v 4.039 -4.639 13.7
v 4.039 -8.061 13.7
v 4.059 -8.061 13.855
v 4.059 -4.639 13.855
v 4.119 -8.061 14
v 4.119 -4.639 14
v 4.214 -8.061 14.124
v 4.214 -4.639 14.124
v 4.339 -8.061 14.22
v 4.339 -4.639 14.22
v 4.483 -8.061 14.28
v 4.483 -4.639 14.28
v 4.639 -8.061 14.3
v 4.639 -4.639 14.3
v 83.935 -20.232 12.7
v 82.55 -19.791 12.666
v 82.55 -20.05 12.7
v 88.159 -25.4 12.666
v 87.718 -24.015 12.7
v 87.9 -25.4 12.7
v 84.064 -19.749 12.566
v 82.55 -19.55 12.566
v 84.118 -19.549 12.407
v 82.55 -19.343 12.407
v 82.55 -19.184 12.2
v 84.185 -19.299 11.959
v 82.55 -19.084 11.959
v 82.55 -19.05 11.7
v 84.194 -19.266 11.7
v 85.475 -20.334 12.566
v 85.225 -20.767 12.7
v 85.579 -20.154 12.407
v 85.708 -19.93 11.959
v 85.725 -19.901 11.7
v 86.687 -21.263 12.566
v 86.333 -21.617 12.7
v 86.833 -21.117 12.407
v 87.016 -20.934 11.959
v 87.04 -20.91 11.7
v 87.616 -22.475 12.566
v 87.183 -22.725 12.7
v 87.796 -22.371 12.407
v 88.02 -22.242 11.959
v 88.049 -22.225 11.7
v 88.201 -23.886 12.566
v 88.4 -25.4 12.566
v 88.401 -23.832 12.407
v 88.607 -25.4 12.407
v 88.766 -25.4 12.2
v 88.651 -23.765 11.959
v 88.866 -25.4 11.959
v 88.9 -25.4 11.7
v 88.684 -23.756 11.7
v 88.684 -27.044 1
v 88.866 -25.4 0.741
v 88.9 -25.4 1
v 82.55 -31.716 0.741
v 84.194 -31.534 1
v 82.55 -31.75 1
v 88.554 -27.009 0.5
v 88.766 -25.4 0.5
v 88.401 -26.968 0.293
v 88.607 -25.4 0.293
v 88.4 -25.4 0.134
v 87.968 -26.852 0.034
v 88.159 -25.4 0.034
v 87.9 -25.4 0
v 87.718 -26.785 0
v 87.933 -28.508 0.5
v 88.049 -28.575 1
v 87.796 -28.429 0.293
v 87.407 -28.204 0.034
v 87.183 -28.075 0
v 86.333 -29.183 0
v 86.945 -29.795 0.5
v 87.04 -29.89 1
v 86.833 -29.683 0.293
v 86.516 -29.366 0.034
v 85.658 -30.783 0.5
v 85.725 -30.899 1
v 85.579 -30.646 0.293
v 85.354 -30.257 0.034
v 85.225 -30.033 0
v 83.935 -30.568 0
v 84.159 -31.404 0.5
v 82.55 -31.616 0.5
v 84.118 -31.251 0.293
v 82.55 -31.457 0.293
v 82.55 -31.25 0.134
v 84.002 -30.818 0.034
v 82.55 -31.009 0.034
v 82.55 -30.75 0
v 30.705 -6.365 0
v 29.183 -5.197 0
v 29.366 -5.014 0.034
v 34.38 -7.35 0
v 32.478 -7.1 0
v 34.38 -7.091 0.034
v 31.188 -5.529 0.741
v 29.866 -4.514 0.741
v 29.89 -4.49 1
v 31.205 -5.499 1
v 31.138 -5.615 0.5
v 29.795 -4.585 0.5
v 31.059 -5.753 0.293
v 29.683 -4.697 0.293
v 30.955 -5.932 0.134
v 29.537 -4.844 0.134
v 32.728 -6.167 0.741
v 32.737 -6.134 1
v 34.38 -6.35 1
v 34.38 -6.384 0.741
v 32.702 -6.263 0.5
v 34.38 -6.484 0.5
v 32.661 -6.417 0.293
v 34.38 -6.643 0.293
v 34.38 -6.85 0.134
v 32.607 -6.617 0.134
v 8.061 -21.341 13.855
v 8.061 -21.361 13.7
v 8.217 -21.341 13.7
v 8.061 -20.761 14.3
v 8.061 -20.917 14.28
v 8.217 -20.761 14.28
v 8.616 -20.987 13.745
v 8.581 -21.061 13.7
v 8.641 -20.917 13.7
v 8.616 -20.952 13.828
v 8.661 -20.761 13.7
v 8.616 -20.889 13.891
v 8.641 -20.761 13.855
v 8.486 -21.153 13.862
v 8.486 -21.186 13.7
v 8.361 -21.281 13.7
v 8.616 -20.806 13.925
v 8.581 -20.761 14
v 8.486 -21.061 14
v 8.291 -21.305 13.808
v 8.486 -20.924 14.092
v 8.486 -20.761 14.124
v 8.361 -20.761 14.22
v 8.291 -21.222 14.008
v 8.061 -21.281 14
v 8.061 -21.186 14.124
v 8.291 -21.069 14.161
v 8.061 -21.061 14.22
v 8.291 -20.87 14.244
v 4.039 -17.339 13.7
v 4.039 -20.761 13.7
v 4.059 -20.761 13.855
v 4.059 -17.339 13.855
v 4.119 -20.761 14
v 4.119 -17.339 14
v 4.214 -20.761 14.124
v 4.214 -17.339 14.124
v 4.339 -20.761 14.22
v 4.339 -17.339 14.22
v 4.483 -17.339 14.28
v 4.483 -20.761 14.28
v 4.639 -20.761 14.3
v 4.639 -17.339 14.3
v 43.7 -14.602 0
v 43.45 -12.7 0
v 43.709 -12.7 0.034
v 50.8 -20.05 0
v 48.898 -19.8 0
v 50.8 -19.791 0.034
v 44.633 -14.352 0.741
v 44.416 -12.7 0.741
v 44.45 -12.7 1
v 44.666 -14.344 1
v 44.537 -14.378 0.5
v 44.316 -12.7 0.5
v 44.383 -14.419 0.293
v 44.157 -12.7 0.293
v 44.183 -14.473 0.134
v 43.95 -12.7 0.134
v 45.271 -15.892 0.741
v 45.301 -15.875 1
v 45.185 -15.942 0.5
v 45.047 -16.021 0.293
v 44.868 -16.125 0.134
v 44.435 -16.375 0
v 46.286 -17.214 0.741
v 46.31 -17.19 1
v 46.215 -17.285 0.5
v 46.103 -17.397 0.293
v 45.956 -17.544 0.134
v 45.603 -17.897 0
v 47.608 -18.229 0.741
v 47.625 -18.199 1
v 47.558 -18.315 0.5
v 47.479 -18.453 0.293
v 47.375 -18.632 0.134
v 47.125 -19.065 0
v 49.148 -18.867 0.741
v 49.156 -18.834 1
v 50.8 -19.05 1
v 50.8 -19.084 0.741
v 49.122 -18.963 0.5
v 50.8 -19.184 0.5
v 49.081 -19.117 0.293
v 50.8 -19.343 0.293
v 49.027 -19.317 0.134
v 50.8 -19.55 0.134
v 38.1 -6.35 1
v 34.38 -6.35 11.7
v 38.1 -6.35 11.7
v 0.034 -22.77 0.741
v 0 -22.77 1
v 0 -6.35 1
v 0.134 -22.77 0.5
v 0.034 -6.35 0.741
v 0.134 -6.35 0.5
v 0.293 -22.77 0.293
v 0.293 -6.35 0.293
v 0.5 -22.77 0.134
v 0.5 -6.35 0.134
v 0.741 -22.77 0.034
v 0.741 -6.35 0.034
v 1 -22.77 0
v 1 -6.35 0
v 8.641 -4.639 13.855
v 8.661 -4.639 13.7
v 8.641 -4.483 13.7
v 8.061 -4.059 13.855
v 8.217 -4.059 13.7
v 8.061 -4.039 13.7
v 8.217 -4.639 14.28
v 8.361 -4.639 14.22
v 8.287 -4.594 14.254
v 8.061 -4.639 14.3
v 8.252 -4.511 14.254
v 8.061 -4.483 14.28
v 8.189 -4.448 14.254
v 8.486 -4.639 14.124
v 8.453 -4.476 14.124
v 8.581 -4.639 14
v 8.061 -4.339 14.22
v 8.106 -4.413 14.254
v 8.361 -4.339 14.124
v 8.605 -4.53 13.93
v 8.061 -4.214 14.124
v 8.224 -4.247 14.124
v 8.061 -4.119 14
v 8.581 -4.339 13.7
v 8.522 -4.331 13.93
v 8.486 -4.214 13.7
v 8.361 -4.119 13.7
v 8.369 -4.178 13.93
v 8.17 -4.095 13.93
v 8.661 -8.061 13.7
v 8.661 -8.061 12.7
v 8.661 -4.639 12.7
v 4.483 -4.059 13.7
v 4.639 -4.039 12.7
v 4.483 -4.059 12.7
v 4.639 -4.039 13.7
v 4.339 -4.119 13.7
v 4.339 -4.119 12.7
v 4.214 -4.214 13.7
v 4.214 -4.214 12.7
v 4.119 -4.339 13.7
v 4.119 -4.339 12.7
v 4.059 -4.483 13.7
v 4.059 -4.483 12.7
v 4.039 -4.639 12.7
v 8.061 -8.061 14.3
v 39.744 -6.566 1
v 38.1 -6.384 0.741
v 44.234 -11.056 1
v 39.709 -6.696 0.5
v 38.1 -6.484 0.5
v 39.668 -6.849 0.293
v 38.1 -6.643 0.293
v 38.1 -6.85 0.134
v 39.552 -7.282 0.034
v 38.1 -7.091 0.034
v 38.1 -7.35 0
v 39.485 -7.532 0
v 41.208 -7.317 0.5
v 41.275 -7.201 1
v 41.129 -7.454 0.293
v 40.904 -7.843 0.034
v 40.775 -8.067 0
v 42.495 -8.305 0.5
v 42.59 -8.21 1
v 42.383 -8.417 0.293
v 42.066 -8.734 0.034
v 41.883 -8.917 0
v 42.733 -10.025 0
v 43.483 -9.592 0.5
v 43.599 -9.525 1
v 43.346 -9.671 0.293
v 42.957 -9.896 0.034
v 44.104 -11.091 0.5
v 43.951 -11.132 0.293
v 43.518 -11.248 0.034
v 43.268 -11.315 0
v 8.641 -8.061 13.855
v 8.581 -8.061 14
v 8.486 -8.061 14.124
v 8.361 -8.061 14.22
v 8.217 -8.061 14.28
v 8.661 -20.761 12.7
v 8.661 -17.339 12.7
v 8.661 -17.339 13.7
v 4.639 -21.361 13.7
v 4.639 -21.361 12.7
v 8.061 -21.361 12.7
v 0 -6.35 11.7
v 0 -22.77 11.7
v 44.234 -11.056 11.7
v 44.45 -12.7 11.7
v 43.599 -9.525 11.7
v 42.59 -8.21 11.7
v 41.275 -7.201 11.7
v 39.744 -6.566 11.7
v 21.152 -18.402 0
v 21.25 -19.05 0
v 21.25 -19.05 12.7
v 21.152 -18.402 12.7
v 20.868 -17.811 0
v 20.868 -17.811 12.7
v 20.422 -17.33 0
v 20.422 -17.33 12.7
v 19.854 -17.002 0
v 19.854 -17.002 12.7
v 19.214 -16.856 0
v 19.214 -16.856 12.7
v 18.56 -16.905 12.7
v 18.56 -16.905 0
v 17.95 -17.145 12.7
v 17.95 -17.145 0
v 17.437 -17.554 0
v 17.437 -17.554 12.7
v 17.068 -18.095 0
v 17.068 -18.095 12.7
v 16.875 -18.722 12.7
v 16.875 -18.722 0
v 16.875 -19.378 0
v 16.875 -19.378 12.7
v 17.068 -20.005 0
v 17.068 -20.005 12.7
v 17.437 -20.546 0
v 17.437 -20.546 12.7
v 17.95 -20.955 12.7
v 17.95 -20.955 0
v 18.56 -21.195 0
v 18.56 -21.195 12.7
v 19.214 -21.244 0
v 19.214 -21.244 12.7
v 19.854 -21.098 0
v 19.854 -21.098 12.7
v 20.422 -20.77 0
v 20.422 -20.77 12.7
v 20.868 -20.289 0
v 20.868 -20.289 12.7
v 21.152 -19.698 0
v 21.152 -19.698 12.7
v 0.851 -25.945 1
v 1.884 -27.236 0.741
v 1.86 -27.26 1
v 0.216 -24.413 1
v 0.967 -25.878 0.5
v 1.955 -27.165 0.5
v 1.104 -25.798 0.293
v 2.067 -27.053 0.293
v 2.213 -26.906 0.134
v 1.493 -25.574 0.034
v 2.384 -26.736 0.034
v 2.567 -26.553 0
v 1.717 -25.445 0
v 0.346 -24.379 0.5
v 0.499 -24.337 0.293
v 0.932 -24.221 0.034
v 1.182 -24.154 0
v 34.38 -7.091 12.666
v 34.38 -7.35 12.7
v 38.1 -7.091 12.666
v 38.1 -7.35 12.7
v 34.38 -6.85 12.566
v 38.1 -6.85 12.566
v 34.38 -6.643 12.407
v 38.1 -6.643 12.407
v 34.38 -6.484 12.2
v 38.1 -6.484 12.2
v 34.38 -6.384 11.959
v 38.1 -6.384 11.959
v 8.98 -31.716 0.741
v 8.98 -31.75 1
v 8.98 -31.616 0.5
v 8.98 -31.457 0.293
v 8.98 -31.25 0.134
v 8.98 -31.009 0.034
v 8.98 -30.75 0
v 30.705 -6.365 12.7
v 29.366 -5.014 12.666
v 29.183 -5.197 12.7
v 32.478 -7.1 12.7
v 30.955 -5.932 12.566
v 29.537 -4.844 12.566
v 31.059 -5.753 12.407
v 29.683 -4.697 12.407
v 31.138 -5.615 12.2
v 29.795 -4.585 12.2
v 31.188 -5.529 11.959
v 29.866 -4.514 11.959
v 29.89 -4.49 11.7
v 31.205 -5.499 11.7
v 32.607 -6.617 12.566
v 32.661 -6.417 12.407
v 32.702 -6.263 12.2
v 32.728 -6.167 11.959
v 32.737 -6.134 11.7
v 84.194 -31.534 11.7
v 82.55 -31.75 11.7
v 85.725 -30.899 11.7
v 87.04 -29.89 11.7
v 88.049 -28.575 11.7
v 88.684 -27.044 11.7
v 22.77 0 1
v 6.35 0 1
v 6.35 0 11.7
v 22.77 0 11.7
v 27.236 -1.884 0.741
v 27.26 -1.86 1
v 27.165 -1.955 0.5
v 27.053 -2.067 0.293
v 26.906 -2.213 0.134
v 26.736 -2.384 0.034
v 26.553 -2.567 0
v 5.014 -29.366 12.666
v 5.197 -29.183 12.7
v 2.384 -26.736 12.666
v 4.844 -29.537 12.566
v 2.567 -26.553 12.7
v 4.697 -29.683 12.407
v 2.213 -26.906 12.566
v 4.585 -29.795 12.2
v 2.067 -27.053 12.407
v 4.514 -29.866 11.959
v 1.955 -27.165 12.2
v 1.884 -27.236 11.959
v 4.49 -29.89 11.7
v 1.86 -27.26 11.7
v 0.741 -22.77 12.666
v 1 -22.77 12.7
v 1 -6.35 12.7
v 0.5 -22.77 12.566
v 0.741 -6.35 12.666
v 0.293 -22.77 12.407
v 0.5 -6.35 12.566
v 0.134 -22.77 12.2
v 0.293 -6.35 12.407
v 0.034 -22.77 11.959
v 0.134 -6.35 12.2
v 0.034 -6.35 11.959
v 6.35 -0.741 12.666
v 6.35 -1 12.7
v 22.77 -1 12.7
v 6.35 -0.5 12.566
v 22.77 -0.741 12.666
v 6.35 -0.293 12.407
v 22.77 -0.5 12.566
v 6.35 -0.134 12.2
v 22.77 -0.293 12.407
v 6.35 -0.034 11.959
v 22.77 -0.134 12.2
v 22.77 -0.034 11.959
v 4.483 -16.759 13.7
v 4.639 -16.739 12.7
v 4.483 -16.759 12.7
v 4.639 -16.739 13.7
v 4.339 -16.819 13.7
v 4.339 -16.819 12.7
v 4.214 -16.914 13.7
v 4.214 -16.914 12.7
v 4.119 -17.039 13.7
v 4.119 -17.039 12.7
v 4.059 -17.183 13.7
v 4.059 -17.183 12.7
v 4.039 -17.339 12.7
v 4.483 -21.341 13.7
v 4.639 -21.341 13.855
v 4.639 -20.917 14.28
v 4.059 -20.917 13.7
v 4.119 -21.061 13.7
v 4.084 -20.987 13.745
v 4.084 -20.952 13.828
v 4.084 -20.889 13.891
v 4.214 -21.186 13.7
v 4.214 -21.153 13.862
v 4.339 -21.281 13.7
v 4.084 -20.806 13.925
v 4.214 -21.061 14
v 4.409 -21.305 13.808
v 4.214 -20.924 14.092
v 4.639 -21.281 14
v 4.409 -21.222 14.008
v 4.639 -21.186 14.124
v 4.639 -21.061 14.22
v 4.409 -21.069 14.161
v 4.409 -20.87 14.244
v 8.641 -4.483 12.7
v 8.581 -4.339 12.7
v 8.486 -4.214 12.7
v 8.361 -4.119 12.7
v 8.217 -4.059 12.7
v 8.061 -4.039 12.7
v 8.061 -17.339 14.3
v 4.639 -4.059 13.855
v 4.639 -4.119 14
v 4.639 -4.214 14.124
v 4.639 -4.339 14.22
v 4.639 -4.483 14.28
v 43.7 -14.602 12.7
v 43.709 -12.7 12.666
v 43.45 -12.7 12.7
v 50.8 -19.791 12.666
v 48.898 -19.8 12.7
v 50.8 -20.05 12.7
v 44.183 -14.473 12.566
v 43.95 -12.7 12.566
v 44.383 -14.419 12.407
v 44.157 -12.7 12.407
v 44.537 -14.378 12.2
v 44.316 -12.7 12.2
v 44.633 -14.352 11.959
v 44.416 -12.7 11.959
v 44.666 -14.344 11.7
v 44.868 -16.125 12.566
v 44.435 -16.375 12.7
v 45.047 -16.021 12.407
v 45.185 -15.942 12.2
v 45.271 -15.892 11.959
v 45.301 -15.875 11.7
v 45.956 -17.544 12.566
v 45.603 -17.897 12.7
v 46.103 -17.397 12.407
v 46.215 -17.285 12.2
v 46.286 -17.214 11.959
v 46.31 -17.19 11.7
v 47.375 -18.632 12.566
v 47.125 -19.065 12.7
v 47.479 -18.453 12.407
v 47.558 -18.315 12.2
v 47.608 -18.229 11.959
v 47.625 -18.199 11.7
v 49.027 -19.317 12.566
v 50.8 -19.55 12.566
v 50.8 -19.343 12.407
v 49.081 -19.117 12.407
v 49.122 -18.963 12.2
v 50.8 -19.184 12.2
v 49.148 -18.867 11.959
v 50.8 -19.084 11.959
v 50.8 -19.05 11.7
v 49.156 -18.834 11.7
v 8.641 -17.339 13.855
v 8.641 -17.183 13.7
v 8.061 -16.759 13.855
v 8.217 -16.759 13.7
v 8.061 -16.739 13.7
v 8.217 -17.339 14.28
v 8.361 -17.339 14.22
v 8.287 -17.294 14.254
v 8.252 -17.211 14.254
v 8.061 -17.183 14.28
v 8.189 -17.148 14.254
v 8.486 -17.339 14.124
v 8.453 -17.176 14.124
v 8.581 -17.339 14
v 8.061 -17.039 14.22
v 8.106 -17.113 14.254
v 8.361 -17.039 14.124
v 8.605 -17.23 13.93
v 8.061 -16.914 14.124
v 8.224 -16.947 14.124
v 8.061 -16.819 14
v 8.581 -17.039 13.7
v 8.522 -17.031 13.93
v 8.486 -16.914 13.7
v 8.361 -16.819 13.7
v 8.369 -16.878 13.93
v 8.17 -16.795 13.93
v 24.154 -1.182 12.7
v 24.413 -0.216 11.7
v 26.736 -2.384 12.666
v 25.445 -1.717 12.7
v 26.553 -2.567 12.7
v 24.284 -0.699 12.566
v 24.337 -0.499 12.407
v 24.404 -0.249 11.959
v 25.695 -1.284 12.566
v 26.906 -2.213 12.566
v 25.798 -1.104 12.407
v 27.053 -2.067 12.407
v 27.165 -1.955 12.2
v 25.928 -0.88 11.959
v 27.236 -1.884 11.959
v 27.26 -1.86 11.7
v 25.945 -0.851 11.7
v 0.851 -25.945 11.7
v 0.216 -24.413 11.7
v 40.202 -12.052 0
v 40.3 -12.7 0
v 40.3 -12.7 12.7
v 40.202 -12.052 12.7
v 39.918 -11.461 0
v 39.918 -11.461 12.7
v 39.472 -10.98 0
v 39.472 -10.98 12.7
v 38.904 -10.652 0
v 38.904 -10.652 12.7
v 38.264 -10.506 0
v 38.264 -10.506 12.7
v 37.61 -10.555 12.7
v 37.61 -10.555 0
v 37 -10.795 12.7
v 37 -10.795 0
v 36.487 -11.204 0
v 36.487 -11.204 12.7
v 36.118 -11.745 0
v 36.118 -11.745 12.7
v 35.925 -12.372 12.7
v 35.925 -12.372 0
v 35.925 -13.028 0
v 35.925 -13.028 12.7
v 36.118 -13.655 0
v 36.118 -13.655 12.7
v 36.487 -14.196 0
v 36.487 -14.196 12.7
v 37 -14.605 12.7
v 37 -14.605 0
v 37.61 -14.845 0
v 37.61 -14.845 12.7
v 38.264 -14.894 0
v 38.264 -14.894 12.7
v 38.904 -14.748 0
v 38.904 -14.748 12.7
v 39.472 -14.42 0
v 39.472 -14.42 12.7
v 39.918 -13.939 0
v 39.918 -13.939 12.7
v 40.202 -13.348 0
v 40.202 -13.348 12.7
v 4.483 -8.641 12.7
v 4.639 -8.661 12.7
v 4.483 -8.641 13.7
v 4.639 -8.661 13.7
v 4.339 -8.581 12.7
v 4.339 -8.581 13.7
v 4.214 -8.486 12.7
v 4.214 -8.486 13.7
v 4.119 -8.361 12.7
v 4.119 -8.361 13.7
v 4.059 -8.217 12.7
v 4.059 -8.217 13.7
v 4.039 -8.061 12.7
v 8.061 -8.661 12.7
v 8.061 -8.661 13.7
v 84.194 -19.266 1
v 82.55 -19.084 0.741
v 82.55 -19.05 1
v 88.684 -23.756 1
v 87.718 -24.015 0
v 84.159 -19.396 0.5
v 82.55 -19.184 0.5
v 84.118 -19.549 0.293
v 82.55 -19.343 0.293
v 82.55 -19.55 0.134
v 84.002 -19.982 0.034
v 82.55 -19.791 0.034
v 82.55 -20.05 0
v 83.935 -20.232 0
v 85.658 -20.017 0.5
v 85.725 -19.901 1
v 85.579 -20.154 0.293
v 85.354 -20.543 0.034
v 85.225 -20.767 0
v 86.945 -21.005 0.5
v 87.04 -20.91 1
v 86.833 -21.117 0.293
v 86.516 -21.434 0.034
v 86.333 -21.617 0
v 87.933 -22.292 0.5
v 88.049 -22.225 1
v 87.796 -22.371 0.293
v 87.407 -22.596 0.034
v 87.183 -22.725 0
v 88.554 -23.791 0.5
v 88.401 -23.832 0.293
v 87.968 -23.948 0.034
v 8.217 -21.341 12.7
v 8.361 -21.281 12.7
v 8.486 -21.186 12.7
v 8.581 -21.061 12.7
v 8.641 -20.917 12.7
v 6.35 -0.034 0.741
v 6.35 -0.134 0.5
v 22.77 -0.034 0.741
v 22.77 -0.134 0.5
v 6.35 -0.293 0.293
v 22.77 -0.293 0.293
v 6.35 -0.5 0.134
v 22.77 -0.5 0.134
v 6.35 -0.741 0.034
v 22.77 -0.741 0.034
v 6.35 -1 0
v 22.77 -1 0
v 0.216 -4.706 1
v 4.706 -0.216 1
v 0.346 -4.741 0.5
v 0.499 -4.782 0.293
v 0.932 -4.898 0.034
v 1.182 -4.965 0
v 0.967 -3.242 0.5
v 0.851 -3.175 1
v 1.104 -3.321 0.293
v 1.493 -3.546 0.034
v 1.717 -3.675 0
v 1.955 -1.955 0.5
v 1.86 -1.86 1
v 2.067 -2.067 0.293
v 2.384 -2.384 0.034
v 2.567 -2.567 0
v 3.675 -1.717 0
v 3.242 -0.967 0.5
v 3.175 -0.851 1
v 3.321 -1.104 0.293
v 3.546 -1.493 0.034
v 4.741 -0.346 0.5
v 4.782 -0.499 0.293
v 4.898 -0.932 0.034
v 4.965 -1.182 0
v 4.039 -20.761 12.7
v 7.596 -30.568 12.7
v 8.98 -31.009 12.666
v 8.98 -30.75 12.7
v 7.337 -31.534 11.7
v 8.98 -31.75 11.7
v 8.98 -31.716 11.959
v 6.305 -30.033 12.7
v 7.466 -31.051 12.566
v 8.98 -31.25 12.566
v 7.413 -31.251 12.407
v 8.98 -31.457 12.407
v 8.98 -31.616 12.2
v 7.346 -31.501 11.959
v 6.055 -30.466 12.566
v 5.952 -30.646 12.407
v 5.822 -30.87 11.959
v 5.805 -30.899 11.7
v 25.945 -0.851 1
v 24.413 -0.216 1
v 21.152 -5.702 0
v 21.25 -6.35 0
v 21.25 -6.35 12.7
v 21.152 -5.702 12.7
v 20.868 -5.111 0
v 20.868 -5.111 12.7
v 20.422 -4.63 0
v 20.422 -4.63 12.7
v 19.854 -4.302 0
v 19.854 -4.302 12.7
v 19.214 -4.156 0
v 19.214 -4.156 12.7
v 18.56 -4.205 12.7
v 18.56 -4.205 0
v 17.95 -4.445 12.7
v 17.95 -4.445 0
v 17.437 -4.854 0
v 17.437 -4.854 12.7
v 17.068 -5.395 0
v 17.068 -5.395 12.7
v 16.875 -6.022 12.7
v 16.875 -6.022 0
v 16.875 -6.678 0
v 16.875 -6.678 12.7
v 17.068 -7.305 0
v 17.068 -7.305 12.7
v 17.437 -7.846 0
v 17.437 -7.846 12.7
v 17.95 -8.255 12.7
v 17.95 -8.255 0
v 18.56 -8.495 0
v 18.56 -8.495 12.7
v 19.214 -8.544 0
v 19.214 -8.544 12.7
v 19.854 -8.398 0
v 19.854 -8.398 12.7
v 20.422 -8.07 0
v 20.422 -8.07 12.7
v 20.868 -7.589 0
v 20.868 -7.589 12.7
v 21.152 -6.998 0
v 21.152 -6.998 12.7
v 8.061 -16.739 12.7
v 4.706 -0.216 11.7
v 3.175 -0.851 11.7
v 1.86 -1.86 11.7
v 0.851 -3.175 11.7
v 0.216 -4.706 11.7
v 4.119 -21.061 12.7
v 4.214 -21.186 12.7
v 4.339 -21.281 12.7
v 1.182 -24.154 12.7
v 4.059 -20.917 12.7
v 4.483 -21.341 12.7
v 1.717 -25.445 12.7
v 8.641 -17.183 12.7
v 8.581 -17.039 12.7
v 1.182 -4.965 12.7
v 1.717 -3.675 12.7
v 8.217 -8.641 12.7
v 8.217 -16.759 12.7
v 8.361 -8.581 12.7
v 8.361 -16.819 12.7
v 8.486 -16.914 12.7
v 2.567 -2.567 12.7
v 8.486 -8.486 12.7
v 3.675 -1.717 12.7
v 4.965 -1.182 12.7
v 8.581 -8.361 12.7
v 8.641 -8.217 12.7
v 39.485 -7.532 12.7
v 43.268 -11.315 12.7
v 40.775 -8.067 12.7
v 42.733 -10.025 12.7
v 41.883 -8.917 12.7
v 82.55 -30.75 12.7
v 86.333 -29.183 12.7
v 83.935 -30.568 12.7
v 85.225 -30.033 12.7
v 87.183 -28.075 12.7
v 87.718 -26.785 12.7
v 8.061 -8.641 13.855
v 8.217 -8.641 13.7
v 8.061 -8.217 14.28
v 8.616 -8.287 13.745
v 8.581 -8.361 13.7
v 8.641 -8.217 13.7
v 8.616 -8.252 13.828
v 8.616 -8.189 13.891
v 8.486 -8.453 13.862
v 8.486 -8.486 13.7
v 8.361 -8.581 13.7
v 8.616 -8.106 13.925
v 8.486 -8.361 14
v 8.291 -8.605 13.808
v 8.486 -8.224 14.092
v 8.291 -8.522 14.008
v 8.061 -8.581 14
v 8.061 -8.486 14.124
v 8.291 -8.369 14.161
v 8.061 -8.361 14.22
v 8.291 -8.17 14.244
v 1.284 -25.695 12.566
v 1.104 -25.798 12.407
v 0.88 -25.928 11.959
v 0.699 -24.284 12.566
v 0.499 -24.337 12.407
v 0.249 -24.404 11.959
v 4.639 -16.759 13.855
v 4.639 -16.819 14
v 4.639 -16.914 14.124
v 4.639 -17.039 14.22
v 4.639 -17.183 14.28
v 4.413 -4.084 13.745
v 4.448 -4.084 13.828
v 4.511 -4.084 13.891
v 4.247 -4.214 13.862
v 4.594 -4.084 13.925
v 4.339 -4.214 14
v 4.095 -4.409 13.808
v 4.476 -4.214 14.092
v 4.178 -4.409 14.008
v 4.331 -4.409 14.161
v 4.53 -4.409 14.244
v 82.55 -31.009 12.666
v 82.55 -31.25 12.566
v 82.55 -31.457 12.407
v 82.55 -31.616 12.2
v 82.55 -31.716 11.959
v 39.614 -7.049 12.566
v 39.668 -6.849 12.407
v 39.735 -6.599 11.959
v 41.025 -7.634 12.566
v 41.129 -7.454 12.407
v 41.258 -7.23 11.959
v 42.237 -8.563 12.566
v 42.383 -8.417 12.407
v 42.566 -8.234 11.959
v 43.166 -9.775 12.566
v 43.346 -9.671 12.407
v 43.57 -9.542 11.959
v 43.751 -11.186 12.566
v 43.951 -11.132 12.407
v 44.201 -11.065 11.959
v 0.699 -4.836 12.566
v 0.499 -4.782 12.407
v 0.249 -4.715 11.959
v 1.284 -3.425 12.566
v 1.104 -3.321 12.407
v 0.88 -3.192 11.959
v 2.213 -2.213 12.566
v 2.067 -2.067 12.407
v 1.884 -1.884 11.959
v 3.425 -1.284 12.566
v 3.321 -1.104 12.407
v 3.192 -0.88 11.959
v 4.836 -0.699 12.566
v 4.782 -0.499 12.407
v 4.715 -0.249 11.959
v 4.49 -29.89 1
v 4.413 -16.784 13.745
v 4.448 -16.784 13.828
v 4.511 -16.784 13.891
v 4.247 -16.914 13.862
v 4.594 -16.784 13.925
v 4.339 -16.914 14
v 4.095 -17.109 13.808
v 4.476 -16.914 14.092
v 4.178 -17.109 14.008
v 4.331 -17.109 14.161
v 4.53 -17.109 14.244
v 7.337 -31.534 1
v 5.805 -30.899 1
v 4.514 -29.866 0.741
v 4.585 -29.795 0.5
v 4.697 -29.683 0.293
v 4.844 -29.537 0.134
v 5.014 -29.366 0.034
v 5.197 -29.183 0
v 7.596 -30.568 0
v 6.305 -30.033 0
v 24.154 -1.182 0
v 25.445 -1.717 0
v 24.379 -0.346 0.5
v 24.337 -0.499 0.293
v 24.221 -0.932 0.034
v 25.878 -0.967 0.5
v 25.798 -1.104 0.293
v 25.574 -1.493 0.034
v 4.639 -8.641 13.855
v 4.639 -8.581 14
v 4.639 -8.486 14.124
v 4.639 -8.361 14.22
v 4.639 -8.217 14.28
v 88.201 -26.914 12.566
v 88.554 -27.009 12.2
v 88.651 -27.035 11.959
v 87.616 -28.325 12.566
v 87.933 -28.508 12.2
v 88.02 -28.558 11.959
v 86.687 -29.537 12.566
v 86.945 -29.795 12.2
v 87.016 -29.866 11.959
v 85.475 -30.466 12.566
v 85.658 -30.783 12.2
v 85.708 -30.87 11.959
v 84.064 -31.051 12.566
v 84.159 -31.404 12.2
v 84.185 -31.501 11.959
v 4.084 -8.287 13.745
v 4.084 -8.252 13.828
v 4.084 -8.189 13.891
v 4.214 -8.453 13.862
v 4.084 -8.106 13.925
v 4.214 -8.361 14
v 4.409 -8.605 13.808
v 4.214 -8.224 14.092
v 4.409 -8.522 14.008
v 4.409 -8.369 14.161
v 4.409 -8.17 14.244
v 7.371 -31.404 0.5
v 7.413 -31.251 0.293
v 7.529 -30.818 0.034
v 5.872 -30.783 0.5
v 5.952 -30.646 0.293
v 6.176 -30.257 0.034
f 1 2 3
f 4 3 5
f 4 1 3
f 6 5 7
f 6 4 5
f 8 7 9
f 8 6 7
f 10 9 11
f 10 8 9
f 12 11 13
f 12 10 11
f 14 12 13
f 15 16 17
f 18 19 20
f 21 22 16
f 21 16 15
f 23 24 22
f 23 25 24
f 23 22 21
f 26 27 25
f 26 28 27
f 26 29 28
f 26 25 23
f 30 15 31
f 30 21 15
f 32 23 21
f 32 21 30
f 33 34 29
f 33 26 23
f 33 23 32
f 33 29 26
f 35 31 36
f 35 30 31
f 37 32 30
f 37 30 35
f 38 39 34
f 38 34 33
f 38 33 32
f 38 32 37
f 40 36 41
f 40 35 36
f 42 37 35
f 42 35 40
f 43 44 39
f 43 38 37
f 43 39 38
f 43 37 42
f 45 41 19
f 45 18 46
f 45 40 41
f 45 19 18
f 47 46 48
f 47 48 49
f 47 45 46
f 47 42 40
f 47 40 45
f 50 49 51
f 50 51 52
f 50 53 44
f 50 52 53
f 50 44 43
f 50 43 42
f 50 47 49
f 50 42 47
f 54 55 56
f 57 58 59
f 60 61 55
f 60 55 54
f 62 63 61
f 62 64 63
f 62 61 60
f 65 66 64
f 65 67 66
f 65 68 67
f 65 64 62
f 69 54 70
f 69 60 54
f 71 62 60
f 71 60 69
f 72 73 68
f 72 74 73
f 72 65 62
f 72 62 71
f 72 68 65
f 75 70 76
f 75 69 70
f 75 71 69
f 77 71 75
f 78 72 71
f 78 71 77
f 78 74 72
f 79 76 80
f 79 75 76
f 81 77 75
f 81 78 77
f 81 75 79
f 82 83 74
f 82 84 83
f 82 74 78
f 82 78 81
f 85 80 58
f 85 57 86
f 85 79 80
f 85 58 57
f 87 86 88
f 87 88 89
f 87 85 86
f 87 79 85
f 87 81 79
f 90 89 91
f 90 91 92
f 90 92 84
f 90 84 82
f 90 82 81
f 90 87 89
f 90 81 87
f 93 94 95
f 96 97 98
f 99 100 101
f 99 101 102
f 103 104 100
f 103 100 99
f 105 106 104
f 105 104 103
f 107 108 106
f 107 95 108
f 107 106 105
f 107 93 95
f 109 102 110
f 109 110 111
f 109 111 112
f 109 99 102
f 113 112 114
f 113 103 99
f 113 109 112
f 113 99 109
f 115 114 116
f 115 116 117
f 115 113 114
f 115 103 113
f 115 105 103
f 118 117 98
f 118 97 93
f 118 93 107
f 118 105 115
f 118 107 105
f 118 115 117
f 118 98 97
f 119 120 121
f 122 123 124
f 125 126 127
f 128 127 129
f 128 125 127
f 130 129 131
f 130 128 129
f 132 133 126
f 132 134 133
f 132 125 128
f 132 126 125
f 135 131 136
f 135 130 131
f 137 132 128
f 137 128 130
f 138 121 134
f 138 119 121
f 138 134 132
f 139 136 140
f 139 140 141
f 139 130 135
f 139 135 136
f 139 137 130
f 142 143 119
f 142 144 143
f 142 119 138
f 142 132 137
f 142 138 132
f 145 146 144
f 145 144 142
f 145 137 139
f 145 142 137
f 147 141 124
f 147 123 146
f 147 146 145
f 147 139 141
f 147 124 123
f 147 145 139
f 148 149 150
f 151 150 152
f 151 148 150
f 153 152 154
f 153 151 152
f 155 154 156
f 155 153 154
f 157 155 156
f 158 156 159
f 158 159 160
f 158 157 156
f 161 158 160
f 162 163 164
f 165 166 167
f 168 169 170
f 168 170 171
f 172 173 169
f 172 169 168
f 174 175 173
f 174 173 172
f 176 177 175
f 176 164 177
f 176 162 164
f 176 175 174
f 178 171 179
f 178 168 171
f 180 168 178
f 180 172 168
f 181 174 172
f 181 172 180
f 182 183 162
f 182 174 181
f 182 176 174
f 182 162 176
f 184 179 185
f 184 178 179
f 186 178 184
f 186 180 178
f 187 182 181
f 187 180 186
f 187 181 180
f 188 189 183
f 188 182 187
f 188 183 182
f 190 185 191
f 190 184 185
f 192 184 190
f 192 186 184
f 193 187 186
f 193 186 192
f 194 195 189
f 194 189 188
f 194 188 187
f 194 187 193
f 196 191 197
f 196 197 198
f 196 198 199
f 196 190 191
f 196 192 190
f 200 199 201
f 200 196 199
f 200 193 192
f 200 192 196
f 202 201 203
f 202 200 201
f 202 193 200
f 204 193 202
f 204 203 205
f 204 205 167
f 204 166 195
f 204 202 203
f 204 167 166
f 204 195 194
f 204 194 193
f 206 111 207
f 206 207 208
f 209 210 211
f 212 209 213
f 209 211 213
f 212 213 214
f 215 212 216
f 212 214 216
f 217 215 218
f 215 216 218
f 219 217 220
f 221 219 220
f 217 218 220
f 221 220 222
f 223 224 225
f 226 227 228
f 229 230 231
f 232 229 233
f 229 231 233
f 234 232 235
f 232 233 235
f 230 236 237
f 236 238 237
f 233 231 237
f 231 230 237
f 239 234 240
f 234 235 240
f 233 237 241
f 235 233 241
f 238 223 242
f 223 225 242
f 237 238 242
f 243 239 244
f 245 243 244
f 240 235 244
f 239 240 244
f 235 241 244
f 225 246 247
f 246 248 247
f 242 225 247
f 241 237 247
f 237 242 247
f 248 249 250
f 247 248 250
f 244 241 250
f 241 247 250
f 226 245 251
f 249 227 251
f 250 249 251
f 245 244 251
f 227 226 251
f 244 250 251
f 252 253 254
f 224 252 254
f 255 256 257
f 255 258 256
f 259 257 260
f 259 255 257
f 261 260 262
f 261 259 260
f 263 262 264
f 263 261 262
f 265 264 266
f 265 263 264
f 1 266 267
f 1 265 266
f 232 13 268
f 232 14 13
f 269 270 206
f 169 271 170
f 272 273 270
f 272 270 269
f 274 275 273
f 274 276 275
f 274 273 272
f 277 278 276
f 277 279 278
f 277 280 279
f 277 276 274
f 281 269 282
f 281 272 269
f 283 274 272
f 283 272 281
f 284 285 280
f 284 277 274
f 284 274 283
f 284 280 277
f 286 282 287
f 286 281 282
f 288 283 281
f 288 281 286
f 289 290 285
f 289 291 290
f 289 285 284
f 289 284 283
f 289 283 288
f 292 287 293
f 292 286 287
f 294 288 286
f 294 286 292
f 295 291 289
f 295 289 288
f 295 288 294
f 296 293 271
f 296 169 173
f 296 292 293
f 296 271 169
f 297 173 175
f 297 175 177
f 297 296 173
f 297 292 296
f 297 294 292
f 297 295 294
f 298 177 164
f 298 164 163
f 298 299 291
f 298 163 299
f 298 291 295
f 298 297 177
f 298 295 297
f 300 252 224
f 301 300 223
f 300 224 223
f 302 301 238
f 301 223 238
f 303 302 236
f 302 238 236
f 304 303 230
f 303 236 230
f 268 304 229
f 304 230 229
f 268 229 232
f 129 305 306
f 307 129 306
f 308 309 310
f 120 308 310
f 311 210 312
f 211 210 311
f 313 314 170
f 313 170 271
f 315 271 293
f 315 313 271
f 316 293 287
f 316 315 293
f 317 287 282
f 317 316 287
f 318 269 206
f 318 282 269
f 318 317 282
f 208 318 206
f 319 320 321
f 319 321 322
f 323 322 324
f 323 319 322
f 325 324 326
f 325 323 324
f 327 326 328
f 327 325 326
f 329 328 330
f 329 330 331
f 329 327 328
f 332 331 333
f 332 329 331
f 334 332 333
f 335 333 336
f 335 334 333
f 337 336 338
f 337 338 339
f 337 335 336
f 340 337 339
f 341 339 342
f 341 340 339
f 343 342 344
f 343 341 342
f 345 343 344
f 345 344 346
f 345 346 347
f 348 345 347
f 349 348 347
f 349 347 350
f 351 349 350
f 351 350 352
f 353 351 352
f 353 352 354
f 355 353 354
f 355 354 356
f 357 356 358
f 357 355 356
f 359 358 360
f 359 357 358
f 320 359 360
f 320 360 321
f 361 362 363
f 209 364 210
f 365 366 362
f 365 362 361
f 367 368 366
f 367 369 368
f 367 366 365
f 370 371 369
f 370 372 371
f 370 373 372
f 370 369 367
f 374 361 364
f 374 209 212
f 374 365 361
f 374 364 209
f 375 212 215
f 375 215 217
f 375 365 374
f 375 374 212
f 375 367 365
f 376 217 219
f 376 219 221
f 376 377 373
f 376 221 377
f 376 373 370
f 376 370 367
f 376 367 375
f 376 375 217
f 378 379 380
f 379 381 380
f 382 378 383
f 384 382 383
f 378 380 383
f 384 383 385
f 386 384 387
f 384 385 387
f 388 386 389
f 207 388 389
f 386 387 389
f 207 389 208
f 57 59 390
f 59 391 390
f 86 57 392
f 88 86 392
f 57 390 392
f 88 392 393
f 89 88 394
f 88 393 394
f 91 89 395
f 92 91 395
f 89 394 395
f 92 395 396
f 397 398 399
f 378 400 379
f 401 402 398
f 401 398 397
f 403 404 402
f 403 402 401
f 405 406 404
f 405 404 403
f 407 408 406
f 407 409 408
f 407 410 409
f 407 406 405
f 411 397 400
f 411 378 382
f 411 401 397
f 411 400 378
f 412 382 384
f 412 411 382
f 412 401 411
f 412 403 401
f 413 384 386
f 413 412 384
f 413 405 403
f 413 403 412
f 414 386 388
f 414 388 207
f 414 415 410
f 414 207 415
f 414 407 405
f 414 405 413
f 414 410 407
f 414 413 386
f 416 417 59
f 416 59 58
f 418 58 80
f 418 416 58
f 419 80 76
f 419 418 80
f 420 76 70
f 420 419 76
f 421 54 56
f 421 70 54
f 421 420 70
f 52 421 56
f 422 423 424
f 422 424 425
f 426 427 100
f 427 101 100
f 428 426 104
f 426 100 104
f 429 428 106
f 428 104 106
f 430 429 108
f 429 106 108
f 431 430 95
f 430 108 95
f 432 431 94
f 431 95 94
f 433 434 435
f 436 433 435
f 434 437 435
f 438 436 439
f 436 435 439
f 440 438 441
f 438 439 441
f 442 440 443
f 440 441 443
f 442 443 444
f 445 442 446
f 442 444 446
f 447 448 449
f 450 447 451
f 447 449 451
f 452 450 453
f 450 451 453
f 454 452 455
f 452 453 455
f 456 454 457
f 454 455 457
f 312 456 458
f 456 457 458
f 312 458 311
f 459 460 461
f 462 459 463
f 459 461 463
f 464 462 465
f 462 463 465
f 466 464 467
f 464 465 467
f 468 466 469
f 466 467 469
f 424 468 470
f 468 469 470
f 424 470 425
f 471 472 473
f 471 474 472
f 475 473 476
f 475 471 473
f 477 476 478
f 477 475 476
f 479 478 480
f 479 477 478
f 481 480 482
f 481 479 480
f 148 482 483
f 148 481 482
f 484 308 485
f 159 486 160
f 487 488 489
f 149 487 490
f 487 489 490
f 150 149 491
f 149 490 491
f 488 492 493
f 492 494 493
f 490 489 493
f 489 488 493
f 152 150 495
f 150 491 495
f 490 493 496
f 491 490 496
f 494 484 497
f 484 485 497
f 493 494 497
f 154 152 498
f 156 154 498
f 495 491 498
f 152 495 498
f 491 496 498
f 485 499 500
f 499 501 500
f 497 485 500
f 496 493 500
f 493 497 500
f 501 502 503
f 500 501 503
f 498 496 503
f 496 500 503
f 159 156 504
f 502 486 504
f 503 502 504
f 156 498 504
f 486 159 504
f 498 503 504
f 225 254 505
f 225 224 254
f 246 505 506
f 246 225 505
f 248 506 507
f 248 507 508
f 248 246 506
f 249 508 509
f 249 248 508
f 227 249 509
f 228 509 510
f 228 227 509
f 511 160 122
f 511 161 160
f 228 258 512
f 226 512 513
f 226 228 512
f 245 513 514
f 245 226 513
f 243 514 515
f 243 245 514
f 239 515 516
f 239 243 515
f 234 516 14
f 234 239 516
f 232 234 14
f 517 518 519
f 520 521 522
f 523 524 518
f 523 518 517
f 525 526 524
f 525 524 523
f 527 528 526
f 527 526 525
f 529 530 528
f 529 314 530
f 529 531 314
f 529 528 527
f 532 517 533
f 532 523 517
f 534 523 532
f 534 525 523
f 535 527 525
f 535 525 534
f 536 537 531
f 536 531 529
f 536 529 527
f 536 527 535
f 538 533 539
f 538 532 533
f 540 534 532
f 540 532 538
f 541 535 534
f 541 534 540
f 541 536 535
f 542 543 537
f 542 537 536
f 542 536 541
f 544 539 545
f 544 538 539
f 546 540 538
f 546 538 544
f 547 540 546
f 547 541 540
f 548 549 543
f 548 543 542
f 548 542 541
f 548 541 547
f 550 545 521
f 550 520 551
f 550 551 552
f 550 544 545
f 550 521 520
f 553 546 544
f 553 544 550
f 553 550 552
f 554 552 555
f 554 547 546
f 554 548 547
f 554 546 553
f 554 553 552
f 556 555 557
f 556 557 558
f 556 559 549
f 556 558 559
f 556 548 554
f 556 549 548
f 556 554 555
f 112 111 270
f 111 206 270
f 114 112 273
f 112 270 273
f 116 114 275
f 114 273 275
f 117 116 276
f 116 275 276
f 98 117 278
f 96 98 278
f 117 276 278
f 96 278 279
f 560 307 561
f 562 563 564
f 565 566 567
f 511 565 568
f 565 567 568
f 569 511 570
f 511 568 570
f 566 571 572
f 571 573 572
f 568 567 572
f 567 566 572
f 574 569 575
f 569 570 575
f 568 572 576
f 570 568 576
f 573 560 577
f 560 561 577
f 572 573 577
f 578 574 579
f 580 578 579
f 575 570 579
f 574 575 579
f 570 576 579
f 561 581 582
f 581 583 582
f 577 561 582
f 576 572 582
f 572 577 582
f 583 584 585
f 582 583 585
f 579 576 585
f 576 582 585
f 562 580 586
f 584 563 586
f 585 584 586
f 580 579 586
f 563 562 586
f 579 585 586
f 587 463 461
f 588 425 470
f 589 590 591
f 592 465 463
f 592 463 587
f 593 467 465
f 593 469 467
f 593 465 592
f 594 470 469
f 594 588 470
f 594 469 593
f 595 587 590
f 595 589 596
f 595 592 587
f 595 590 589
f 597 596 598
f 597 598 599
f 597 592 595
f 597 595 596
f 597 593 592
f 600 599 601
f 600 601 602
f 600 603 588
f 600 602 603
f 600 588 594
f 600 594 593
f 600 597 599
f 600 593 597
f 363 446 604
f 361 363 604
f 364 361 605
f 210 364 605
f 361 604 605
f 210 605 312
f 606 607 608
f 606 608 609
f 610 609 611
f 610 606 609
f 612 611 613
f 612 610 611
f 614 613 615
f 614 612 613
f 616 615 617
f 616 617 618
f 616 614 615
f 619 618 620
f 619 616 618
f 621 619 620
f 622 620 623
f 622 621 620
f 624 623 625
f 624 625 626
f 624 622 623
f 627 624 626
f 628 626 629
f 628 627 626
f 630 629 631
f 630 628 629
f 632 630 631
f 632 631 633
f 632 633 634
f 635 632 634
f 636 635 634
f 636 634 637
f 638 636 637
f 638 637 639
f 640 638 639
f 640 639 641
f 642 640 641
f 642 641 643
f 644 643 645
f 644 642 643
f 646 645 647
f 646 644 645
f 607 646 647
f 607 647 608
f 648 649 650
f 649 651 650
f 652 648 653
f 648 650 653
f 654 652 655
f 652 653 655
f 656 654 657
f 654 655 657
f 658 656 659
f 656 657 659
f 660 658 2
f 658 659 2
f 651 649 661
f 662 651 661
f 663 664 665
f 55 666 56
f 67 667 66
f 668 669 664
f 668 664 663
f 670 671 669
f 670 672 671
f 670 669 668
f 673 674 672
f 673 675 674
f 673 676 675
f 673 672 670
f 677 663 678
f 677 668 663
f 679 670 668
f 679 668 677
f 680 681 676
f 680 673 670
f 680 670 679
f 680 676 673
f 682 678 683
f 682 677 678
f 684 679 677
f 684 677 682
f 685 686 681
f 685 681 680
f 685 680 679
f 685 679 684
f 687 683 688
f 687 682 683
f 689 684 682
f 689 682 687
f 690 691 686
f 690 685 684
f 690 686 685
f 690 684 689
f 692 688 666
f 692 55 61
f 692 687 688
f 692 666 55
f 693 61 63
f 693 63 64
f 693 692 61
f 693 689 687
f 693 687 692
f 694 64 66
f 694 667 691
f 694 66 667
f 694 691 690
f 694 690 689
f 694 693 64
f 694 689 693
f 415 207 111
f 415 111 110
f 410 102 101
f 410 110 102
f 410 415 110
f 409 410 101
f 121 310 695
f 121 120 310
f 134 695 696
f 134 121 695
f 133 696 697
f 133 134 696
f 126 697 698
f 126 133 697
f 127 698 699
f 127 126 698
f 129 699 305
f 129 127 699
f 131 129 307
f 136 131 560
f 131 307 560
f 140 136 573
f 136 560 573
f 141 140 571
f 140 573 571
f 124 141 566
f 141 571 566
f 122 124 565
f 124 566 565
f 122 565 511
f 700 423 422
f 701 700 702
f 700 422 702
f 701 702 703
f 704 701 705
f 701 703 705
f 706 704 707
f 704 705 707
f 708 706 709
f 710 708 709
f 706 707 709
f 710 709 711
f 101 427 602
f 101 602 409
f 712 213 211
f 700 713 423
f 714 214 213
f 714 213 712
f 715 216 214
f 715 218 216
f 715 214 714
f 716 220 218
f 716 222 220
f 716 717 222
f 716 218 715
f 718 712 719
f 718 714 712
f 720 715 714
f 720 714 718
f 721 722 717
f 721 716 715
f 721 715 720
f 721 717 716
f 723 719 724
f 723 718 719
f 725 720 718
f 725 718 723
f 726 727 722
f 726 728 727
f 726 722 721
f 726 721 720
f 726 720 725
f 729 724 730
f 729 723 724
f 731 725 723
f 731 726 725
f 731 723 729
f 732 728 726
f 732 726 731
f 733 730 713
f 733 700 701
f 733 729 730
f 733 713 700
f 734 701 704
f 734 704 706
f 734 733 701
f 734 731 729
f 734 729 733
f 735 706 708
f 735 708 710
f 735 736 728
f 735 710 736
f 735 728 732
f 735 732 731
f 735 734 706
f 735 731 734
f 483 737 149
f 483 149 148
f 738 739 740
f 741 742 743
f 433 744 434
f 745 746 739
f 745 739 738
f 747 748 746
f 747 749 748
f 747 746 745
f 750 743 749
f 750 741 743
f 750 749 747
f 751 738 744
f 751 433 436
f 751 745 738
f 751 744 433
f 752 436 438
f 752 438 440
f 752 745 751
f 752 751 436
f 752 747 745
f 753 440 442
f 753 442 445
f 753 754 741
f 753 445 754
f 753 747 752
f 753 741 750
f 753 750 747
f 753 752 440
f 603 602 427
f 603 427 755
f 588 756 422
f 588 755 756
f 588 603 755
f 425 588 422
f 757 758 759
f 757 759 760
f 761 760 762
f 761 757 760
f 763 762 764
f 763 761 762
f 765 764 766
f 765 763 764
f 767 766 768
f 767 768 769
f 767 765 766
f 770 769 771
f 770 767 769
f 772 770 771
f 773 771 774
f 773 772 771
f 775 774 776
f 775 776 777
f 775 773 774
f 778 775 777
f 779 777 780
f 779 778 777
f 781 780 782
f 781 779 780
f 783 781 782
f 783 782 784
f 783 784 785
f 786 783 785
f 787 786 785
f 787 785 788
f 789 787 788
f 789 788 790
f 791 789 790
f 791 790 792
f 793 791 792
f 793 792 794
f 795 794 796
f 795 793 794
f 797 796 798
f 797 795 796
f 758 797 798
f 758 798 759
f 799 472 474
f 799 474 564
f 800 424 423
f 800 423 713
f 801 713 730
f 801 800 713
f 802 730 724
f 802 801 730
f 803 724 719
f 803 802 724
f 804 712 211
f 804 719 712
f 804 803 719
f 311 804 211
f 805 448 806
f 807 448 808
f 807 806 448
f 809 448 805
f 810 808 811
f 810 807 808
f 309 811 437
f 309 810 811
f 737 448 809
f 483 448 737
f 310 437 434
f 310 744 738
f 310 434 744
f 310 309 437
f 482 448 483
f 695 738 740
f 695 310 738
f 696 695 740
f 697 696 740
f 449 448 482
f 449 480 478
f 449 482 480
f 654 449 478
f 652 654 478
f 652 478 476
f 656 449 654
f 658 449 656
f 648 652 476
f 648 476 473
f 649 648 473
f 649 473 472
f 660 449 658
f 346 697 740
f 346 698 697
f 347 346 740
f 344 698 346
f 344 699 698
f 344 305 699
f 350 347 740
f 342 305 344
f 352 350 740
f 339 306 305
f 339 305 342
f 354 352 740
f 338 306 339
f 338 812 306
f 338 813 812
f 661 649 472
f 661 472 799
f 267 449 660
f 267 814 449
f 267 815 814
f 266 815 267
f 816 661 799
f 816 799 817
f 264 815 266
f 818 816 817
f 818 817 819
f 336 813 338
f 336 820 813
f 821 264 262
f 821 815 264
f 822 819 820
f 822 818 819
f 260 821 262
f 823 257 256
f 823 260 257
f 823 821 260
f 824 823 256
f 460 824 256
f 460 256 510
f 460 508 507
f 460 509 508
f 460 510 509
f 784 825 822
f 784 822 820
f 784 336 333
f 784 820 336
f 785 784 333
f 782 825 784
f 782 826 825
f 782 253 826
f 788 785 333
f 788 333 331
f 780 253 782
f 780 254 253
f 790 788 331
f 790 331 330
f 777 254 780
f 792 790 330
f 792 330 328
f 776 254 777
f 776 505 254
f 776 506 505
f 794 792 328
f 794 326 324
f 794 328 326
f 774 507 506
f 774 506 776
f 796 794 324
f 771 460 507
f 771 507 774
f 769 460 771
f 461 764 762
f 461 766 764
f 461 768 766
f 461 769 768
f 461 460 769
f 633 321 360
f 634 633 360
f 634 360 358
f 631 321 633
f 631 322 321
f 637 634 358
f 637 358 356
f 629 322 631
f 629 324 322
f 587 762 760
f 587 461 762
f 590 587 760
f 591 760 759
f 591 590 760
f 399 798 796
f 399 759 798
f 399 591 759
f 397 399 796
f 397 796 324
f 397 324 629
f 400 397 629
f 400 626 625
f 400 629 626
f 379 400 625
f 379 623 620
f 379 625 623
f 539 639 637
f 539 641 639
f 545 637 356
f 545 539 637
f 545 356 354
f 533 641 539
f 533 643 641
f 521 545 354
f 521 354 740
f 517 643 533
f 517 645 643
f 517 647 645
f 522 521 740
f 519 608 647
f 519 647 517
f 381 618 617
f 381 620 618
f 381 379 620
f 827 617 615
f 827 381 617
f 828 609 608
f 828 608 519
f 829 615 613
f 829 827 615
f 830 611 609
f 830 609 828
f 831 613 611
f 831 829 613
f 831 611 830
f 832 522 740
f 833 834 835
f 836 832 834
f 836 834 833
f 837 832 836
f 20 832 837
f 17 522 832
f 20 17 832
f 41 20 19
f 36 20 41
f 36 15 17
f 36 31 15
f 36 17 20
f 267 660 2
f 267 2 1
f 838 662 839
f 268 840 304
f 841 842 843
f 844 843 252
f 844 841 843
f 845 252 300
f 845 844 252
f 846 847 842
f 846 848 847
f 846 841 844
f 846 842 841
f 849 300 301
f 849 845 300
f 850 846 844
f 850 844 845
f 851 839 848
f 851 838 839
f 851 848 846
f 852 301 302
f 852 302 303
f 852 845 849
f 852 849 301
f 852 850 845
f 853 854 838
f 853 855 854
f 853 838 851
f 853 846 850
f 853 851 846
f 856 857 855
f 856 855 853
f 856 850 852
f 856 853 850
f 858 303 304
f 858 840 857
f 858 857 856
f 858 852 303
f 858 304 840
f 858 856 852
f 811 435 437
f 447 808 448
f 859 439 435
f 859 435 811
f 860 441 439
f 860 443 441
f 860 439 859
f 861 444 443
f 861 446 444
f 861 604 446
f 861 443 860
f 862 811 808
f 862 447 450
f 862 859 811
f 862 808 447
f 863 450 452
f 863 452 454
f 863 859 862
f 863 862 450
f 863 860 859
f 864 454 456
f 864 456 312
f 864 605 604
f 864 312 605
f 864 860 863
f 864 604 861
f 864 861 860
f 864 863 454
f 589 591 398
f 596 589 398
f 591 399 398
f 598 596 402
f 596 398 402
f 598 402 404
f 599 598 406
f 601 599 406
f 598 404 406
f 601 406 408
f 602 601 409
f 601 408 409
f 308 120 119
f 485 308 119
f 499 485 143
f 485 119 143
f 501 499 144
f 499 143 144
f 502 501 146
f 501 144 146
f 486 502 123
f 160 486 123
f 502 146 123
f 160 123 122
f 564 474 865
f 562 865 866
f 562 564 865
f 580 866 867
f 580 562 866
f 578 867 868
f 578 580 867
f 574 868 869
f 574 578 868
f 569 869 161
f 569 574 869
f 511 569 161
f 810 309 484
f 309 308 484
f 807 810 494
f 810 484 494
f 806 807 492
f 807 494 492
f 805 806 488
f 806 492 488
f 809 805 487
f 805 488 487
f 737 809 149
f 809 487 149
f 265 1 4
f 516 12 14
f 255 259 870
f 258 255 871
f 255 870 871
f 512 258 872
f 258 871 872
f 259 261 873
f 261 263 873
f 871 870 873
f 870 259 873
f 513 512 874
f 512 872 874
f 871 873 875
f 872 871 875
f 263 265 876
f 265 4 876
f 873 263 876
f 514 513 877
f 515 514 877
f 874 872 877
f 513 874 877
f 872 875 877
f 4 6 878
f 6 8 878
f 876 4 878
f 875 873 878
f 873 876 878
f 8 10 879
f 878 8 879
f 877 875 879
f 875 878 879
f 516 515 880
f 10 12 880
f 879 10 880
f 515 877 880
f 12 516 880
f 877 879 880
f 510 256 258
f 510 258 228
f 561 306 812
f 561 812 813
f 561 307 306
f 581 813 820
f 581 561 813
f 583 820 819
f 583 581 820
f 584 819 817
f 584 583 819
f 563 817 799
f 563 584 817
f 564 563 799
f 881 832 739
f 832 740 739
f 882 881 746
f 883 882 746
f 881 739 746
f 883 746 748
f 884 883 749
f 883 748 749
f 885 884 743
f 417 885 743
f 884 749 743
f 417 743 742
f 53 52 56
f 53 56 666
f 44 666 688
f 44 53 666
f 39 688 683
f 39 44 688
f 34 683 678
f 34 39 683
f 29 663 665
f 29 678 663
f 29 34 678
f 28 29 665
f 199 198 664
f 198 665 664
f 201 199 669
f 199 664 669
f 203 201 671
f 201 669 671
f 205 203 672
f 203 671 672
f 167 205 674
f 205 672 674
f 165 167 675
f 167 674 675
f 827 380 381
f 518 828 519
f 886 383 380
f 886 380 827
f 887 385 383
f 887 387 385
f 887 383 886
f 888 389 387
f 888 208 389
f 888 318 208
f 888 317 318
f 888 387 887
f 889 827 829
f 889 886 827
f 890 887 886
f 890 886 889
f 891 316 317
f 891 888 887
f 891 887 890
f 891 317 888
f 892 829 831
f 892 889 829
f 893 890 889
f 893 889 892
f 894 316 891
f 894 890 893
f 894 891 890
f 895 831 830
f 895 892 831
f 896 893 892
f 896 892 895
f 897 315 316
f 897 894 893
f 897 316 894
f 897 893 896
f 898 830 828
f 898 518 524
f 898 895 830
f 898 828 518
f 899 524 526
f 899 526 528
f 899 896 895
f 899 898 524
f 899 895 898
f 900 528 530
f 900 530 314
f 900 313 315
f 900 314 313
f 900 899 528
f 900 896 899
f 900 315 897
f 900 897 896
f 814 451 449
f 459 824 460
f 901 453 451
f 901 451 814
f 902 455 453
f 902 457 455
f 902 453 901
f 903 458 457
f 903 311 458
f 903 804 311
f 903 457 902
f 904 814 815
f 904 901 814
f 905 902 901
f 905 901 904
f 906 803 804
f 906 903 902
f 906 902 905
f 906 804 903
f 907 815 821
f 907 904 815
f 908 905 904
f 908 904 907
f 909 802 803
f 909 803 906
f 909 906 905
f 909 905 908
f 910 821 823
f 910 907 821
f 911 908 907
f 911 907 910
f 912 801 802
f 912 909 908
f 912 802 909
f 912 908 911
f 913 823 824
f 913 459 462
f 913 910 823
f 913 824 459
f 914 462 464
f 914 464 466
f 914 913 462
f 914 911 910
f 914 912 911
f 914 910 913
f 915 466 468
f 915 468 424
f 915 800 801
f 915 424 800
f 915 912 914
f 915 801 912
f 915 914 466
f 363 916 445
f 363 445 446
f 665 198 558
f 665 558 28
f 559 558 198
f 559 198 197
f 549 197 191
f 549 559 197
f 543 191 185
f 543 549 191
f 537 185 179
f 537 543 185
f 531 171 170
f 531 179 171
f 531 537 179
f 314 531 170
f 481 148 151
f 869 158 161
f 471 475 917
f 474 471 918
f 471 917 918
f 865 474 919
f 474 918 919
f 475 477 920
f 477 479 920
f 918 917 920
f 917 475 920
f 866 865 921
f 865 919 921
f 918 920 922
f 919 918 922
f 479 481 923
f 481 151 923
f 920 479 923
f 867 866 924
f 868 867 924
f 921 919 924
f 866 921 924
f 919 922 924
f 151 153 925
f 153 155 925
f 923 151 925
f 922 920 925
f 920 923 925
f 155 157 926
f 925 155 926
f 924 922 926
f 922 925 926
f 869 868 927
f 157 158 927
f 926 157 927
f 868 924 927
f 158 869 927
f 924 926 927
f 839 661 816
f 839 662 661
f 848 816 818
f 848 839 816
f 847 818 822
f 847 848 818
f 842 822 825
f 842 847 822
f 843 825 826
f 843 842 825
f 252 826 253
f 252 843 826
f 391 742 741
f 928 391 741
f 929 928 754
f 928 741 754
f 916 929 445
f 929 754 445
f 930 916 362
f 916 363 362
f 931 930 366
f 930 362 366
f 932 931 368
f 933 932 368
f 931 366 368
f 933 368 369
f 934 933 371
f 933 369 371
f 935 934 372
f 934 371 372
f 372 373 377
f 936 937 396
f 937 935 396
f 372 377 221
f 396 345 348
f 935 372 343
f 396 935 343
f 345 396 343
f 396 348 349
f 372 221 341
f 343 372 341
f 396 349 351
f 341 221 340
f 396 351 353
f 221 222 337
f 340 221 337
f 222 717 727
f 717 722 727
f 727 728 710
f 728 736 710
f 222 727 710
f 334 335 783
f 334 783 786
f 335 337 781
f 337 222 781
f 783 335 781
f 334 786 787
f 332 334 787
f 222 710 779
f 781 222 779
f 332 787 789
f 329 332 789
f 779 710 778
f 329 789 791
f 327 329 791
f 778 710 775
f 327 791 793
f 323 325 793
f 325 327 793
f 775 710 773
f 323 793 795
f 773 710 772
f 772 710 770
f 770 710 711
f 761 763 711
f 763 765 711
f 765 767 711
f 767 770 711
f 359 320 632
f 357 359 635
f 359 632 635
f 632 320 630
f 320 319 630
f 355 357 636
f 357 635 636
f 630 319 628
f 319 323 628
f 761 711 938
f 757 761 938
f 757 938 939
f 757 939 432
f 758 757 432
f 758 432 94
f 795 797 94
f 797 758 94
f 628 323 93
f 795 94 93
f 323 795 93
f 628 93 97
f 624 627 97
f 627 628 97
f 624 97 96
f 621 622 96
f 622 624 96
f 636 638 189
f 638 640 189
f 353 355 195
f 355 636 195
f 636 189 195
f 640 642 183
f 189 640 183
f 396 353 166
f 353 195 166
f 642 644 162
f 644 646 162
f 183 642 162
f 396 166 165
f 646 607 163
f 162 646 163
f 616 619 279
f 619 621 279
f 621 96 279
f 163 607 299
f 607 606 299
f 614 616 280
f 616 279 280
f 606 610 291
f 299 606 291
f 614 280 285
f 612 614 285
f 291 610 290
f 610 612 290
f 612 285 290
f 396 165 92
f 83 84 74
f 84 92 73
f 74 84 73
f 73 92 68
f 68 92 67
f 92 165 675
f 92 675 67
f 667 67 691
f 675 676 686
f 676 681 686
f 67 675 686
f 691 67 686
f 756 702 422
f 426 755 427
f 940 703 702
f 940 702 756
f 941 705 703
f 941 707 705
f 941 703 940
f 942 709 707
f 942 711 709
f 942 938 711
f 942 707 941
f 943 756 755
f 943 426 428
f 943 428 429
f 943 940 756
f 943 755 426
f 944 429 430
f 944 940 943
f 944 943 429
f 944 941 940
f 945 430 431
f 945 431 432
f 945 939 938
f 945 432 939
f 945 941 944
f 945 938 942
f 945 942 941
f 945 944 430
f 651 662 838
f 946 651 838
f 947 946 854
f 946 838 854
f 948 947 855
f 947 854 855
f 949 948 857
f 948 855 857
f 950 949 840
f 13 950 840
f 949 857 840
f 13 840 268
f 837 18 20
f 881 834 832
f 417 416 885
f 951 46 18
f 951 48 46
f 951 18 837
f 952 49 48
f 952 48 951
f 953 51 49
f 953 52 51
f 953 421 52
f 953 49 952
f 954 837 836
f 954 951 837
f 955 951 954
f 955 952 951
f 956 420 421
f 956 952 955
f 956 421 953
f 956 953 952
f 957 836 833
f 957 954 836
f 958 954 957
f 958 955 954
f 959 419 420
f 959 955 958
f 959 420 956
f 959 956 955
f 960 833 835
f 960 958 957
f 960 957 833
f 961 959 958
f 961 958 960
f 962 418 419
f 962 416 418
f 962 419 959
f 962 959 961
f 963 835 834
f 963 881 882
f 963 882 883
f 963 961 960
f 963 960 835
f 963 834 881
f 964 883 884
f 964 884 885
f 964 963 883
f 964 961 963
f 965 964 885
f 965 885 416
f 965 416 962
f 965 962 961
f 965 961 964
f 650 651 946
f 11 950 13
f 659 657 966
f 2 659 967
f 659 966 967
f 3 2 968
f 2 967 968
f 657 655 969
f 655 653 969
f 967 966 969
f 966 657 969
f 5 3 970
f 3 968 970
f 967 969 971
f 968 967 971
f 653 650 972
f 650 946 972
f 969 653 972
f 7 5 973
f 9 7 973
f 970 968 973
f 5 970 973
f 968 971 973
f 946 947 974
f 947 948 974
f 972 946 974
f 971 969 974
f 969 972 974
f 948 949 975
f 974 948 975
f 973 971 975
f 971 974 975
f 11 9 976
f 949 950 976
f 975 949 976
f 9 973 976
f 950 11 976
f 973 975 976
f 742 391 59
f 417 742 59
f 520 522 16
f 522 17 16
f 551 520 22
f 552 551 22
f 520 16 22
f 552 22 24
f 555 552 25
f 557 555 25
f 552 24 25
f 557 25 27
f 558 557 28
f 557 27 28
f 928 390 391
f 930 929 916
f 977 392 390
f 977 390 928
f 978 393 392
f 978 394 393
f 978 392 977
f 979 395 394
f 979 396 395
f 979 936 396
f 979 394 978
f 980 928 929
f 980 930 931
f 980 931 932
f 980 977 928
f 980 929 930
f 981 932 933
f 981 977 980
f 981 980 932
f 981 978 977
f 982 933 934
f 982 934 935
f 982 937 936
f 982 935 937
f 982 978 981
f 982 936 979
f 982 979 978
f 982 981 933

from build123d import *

# Parameters (mm, degrees)
SKETCH1_R           = 2.2
SKETCH1_W           = 25.4
SKETCH1_H           = 25.4
SKETCH1_W_2         = 4.6228
SKETCH1_H_2         = 4.6228
SKETCH1_W_3         = 12.7
SKETCH1_H_3         = 12.7
BOSS_EXTRUDE1_DEPTH = 12.7
BOSS_EXTRUDE2_START = 12.7
SKETCH1_3_W         = 4.6228
SKETCH1_3_H         = 4.6228
BOSS_EXTRUDE2_DEPTH = 1.6
FILLET1_R           = 6.35
FILLET2_R           = 0.6
FILLET3_R           = 1


with BuildPart() as part:
    # Sketch1 → Boss-Extrude1 (new body)
    # profile 1 of 5: a face of its own
    with BuildSketch(Plane.XY):
        Polygon((6.35, -31.75), (0, -25.4), (25.4, -25.4), (25.4, 0), (31.75, -6.35), (44.45, -6.35), (44.45, -19.05), (76.2, -19.05), (76.2, -31.75), align=None)
        with Locations((38.1, -12.7)):
            Circle(SKETCH1_R, mode=Mode.SUBTRACT)
    # profile 2 of 5: a face of its own
    with BuildSketch(Plane.XY):
        with Locations((12.7, -12.7)):
            Rectangle(SKETCH1_W, SKETCH1_H)
        with Locations((19.05, -19.05)):
            Circle(SKETCH1_R, mode=Mode.SUBTRACT)
        with Locations((19.05, -6.35)):
            Circle(SKETCH1_R, mode=Mode.SUBTRACT)
        with Locations((6.35, -6.35)):
            Rectangle(SKETCH1_W_2, SKETCH1_H_2, mode=Mode.SUBTRACT)
        with Locations((6.35, -19.05)):
            Rectangle(SKETCH1_W_2, SKETCH1_H_2, mode=Mode.SUBTRACT)
    # profile 3 of 5: a face of its own
    with BuildSketch(Plane.XY):
        with Locations((6.35, -19.05)):
            Rectangle(SKETCH1_W_2, SKETCH1_H_2)
    # profile 4 of 5: a face of its own
    with BuildSketch(Plane.XY):
        with Locations((6.35, -6.35)):
            Rectangle(SKETCH1_W_2, SKETCH1_H_2)
    # profile 5 of 5: a face of its own
    with BuildSketch(Plane.XY):
        with Locations((82.55, -25.4)):
            Rectangle(SKETCH1_W_3, SKETCH1_H_3)
    extrude(amount=BOSS_EXTRUDE1_DEPTH)

    # Sketch1<3> → Boss-Extrude2 (add)
    with BuildSketch(Plane.XY.offset(BOSS_EXTRUDE2_START)):
        with Locations((6.35, -6.35)):
            Rectangle(SKETCH1_3_W, SKETCH1_3_H)
        with Locations((6.35, -19.05)):
            Rectangle(SKETCH1_3_W, SKETCH1_3_H)
    extrude(amount=BOSS_EXTRUDE2_DEPTH)

    # Fillet1
    fillet1_edges = [part.edges().sort_by_distance(p)[0] for p in [
        (88.9, -31.75, 6.35),
        (88.9, -19.05, 6.35),
        (44.45, -19.05, 6.35),
        (44.45, -6.35, 6.35),
        (31.75, -6.35, 6.35),
        (25.4, 0, 6.35),
        (6.35, -31.75, 6.35),
        (0, -25.4, 6.35),
        (0, 0, 6.35),
    ]]
    fillet(fillet1_edges, radius=FILLET1_R - 0.0001)  # a hair under: the kernel refuses the full size

    # Fillet2
    fillet2_edges = [part.edges().sort_by_distance(p)[0] for p in [
        (6.35, -8.6614, 14.3),
        (4.0386, -8.6614, 13.5),
        (8.6614, -8.6614, 13.5),
        (8.6614, -4.0386, 13.5),
        (4.0386, -6.35, 14.3),
        (4.0386, -4.0386, 13.5),
        (8.6614, -6.35, 14.3),
        (6.35, -4.0386, 14.3),
        (6.35, -21.3614, 14.3),
        (4.0386, -21.3614, 13.5),
        (8.6614, -21.3614, 13.5),
        (8.6614, -16.7386, 13.5),
        (4.0386, -19.05, 14.3),
        (4.0386, -16.7386, 13.5),
        (8.6614, -19.05, 14.3),
        (6.35, -16.7386, 14.3),
    ]]
    fillet(fillet2_edges, radius=FILLET2_R)

    # Fillet3
    fillet3_edges = [part.edges().sort_by_distance(p)[0] for p in [
        (3.175, -28.575, 0),
        (0, -14.55984265, 0),
        (14.55984265, 0, 0),
        (28.575, -3.175, 0),
        (36.24015735, -6.35, 0),
        (66.675, -19.05, 0),
        (45.76515735, -31.75, 0),
        (1.85984265, -1.85984265, 0),
        (0.483357357, -25.199786827, 0),
        (6.550213173, -31.266642643, 0),
        (25.199786827, -0.483357357, 0),
        (42.59015735, -8.20984265, 0),
        (87.04015735, -20.90984265, 0),
        (87.04015735, -29.89015735, 0),
        (45.76515735, -31.75, 12.7),
        (3.175, -28.575, 12.7),
        (66.675, -19.05, 12.7),
        (36.24015735, -6.35, 12.7),
        (28.575, -3.175, 12.7),
        (14.55984265, 0, 12.7),
        (0, -14.55984265, 12.7),
        (1.85984265, -1.85984265, 12.7),
        (0.483357357, -25.199786827, 12.7),
        (6.550213173, -31.266642643, 12.7),
        (25.199786827, -0.483357357, 12.7),
        (42.59015735, -8.20984265, 12.7),
        (87.04015735, -20.90984265, 12.7),
        (87.04015735, -29.89015735, 12.7),
        (46.30984265, -17.19015735, 0),
        (46.30984265, -17.19015735, 12.7),
        (31.950213173, -5.866642643, 0),
        (31.950213173, -5.866642643, 12.7),
    ]]
    fillet(fillet3_edges, radius=FILLET3_R)


solid = part.part
